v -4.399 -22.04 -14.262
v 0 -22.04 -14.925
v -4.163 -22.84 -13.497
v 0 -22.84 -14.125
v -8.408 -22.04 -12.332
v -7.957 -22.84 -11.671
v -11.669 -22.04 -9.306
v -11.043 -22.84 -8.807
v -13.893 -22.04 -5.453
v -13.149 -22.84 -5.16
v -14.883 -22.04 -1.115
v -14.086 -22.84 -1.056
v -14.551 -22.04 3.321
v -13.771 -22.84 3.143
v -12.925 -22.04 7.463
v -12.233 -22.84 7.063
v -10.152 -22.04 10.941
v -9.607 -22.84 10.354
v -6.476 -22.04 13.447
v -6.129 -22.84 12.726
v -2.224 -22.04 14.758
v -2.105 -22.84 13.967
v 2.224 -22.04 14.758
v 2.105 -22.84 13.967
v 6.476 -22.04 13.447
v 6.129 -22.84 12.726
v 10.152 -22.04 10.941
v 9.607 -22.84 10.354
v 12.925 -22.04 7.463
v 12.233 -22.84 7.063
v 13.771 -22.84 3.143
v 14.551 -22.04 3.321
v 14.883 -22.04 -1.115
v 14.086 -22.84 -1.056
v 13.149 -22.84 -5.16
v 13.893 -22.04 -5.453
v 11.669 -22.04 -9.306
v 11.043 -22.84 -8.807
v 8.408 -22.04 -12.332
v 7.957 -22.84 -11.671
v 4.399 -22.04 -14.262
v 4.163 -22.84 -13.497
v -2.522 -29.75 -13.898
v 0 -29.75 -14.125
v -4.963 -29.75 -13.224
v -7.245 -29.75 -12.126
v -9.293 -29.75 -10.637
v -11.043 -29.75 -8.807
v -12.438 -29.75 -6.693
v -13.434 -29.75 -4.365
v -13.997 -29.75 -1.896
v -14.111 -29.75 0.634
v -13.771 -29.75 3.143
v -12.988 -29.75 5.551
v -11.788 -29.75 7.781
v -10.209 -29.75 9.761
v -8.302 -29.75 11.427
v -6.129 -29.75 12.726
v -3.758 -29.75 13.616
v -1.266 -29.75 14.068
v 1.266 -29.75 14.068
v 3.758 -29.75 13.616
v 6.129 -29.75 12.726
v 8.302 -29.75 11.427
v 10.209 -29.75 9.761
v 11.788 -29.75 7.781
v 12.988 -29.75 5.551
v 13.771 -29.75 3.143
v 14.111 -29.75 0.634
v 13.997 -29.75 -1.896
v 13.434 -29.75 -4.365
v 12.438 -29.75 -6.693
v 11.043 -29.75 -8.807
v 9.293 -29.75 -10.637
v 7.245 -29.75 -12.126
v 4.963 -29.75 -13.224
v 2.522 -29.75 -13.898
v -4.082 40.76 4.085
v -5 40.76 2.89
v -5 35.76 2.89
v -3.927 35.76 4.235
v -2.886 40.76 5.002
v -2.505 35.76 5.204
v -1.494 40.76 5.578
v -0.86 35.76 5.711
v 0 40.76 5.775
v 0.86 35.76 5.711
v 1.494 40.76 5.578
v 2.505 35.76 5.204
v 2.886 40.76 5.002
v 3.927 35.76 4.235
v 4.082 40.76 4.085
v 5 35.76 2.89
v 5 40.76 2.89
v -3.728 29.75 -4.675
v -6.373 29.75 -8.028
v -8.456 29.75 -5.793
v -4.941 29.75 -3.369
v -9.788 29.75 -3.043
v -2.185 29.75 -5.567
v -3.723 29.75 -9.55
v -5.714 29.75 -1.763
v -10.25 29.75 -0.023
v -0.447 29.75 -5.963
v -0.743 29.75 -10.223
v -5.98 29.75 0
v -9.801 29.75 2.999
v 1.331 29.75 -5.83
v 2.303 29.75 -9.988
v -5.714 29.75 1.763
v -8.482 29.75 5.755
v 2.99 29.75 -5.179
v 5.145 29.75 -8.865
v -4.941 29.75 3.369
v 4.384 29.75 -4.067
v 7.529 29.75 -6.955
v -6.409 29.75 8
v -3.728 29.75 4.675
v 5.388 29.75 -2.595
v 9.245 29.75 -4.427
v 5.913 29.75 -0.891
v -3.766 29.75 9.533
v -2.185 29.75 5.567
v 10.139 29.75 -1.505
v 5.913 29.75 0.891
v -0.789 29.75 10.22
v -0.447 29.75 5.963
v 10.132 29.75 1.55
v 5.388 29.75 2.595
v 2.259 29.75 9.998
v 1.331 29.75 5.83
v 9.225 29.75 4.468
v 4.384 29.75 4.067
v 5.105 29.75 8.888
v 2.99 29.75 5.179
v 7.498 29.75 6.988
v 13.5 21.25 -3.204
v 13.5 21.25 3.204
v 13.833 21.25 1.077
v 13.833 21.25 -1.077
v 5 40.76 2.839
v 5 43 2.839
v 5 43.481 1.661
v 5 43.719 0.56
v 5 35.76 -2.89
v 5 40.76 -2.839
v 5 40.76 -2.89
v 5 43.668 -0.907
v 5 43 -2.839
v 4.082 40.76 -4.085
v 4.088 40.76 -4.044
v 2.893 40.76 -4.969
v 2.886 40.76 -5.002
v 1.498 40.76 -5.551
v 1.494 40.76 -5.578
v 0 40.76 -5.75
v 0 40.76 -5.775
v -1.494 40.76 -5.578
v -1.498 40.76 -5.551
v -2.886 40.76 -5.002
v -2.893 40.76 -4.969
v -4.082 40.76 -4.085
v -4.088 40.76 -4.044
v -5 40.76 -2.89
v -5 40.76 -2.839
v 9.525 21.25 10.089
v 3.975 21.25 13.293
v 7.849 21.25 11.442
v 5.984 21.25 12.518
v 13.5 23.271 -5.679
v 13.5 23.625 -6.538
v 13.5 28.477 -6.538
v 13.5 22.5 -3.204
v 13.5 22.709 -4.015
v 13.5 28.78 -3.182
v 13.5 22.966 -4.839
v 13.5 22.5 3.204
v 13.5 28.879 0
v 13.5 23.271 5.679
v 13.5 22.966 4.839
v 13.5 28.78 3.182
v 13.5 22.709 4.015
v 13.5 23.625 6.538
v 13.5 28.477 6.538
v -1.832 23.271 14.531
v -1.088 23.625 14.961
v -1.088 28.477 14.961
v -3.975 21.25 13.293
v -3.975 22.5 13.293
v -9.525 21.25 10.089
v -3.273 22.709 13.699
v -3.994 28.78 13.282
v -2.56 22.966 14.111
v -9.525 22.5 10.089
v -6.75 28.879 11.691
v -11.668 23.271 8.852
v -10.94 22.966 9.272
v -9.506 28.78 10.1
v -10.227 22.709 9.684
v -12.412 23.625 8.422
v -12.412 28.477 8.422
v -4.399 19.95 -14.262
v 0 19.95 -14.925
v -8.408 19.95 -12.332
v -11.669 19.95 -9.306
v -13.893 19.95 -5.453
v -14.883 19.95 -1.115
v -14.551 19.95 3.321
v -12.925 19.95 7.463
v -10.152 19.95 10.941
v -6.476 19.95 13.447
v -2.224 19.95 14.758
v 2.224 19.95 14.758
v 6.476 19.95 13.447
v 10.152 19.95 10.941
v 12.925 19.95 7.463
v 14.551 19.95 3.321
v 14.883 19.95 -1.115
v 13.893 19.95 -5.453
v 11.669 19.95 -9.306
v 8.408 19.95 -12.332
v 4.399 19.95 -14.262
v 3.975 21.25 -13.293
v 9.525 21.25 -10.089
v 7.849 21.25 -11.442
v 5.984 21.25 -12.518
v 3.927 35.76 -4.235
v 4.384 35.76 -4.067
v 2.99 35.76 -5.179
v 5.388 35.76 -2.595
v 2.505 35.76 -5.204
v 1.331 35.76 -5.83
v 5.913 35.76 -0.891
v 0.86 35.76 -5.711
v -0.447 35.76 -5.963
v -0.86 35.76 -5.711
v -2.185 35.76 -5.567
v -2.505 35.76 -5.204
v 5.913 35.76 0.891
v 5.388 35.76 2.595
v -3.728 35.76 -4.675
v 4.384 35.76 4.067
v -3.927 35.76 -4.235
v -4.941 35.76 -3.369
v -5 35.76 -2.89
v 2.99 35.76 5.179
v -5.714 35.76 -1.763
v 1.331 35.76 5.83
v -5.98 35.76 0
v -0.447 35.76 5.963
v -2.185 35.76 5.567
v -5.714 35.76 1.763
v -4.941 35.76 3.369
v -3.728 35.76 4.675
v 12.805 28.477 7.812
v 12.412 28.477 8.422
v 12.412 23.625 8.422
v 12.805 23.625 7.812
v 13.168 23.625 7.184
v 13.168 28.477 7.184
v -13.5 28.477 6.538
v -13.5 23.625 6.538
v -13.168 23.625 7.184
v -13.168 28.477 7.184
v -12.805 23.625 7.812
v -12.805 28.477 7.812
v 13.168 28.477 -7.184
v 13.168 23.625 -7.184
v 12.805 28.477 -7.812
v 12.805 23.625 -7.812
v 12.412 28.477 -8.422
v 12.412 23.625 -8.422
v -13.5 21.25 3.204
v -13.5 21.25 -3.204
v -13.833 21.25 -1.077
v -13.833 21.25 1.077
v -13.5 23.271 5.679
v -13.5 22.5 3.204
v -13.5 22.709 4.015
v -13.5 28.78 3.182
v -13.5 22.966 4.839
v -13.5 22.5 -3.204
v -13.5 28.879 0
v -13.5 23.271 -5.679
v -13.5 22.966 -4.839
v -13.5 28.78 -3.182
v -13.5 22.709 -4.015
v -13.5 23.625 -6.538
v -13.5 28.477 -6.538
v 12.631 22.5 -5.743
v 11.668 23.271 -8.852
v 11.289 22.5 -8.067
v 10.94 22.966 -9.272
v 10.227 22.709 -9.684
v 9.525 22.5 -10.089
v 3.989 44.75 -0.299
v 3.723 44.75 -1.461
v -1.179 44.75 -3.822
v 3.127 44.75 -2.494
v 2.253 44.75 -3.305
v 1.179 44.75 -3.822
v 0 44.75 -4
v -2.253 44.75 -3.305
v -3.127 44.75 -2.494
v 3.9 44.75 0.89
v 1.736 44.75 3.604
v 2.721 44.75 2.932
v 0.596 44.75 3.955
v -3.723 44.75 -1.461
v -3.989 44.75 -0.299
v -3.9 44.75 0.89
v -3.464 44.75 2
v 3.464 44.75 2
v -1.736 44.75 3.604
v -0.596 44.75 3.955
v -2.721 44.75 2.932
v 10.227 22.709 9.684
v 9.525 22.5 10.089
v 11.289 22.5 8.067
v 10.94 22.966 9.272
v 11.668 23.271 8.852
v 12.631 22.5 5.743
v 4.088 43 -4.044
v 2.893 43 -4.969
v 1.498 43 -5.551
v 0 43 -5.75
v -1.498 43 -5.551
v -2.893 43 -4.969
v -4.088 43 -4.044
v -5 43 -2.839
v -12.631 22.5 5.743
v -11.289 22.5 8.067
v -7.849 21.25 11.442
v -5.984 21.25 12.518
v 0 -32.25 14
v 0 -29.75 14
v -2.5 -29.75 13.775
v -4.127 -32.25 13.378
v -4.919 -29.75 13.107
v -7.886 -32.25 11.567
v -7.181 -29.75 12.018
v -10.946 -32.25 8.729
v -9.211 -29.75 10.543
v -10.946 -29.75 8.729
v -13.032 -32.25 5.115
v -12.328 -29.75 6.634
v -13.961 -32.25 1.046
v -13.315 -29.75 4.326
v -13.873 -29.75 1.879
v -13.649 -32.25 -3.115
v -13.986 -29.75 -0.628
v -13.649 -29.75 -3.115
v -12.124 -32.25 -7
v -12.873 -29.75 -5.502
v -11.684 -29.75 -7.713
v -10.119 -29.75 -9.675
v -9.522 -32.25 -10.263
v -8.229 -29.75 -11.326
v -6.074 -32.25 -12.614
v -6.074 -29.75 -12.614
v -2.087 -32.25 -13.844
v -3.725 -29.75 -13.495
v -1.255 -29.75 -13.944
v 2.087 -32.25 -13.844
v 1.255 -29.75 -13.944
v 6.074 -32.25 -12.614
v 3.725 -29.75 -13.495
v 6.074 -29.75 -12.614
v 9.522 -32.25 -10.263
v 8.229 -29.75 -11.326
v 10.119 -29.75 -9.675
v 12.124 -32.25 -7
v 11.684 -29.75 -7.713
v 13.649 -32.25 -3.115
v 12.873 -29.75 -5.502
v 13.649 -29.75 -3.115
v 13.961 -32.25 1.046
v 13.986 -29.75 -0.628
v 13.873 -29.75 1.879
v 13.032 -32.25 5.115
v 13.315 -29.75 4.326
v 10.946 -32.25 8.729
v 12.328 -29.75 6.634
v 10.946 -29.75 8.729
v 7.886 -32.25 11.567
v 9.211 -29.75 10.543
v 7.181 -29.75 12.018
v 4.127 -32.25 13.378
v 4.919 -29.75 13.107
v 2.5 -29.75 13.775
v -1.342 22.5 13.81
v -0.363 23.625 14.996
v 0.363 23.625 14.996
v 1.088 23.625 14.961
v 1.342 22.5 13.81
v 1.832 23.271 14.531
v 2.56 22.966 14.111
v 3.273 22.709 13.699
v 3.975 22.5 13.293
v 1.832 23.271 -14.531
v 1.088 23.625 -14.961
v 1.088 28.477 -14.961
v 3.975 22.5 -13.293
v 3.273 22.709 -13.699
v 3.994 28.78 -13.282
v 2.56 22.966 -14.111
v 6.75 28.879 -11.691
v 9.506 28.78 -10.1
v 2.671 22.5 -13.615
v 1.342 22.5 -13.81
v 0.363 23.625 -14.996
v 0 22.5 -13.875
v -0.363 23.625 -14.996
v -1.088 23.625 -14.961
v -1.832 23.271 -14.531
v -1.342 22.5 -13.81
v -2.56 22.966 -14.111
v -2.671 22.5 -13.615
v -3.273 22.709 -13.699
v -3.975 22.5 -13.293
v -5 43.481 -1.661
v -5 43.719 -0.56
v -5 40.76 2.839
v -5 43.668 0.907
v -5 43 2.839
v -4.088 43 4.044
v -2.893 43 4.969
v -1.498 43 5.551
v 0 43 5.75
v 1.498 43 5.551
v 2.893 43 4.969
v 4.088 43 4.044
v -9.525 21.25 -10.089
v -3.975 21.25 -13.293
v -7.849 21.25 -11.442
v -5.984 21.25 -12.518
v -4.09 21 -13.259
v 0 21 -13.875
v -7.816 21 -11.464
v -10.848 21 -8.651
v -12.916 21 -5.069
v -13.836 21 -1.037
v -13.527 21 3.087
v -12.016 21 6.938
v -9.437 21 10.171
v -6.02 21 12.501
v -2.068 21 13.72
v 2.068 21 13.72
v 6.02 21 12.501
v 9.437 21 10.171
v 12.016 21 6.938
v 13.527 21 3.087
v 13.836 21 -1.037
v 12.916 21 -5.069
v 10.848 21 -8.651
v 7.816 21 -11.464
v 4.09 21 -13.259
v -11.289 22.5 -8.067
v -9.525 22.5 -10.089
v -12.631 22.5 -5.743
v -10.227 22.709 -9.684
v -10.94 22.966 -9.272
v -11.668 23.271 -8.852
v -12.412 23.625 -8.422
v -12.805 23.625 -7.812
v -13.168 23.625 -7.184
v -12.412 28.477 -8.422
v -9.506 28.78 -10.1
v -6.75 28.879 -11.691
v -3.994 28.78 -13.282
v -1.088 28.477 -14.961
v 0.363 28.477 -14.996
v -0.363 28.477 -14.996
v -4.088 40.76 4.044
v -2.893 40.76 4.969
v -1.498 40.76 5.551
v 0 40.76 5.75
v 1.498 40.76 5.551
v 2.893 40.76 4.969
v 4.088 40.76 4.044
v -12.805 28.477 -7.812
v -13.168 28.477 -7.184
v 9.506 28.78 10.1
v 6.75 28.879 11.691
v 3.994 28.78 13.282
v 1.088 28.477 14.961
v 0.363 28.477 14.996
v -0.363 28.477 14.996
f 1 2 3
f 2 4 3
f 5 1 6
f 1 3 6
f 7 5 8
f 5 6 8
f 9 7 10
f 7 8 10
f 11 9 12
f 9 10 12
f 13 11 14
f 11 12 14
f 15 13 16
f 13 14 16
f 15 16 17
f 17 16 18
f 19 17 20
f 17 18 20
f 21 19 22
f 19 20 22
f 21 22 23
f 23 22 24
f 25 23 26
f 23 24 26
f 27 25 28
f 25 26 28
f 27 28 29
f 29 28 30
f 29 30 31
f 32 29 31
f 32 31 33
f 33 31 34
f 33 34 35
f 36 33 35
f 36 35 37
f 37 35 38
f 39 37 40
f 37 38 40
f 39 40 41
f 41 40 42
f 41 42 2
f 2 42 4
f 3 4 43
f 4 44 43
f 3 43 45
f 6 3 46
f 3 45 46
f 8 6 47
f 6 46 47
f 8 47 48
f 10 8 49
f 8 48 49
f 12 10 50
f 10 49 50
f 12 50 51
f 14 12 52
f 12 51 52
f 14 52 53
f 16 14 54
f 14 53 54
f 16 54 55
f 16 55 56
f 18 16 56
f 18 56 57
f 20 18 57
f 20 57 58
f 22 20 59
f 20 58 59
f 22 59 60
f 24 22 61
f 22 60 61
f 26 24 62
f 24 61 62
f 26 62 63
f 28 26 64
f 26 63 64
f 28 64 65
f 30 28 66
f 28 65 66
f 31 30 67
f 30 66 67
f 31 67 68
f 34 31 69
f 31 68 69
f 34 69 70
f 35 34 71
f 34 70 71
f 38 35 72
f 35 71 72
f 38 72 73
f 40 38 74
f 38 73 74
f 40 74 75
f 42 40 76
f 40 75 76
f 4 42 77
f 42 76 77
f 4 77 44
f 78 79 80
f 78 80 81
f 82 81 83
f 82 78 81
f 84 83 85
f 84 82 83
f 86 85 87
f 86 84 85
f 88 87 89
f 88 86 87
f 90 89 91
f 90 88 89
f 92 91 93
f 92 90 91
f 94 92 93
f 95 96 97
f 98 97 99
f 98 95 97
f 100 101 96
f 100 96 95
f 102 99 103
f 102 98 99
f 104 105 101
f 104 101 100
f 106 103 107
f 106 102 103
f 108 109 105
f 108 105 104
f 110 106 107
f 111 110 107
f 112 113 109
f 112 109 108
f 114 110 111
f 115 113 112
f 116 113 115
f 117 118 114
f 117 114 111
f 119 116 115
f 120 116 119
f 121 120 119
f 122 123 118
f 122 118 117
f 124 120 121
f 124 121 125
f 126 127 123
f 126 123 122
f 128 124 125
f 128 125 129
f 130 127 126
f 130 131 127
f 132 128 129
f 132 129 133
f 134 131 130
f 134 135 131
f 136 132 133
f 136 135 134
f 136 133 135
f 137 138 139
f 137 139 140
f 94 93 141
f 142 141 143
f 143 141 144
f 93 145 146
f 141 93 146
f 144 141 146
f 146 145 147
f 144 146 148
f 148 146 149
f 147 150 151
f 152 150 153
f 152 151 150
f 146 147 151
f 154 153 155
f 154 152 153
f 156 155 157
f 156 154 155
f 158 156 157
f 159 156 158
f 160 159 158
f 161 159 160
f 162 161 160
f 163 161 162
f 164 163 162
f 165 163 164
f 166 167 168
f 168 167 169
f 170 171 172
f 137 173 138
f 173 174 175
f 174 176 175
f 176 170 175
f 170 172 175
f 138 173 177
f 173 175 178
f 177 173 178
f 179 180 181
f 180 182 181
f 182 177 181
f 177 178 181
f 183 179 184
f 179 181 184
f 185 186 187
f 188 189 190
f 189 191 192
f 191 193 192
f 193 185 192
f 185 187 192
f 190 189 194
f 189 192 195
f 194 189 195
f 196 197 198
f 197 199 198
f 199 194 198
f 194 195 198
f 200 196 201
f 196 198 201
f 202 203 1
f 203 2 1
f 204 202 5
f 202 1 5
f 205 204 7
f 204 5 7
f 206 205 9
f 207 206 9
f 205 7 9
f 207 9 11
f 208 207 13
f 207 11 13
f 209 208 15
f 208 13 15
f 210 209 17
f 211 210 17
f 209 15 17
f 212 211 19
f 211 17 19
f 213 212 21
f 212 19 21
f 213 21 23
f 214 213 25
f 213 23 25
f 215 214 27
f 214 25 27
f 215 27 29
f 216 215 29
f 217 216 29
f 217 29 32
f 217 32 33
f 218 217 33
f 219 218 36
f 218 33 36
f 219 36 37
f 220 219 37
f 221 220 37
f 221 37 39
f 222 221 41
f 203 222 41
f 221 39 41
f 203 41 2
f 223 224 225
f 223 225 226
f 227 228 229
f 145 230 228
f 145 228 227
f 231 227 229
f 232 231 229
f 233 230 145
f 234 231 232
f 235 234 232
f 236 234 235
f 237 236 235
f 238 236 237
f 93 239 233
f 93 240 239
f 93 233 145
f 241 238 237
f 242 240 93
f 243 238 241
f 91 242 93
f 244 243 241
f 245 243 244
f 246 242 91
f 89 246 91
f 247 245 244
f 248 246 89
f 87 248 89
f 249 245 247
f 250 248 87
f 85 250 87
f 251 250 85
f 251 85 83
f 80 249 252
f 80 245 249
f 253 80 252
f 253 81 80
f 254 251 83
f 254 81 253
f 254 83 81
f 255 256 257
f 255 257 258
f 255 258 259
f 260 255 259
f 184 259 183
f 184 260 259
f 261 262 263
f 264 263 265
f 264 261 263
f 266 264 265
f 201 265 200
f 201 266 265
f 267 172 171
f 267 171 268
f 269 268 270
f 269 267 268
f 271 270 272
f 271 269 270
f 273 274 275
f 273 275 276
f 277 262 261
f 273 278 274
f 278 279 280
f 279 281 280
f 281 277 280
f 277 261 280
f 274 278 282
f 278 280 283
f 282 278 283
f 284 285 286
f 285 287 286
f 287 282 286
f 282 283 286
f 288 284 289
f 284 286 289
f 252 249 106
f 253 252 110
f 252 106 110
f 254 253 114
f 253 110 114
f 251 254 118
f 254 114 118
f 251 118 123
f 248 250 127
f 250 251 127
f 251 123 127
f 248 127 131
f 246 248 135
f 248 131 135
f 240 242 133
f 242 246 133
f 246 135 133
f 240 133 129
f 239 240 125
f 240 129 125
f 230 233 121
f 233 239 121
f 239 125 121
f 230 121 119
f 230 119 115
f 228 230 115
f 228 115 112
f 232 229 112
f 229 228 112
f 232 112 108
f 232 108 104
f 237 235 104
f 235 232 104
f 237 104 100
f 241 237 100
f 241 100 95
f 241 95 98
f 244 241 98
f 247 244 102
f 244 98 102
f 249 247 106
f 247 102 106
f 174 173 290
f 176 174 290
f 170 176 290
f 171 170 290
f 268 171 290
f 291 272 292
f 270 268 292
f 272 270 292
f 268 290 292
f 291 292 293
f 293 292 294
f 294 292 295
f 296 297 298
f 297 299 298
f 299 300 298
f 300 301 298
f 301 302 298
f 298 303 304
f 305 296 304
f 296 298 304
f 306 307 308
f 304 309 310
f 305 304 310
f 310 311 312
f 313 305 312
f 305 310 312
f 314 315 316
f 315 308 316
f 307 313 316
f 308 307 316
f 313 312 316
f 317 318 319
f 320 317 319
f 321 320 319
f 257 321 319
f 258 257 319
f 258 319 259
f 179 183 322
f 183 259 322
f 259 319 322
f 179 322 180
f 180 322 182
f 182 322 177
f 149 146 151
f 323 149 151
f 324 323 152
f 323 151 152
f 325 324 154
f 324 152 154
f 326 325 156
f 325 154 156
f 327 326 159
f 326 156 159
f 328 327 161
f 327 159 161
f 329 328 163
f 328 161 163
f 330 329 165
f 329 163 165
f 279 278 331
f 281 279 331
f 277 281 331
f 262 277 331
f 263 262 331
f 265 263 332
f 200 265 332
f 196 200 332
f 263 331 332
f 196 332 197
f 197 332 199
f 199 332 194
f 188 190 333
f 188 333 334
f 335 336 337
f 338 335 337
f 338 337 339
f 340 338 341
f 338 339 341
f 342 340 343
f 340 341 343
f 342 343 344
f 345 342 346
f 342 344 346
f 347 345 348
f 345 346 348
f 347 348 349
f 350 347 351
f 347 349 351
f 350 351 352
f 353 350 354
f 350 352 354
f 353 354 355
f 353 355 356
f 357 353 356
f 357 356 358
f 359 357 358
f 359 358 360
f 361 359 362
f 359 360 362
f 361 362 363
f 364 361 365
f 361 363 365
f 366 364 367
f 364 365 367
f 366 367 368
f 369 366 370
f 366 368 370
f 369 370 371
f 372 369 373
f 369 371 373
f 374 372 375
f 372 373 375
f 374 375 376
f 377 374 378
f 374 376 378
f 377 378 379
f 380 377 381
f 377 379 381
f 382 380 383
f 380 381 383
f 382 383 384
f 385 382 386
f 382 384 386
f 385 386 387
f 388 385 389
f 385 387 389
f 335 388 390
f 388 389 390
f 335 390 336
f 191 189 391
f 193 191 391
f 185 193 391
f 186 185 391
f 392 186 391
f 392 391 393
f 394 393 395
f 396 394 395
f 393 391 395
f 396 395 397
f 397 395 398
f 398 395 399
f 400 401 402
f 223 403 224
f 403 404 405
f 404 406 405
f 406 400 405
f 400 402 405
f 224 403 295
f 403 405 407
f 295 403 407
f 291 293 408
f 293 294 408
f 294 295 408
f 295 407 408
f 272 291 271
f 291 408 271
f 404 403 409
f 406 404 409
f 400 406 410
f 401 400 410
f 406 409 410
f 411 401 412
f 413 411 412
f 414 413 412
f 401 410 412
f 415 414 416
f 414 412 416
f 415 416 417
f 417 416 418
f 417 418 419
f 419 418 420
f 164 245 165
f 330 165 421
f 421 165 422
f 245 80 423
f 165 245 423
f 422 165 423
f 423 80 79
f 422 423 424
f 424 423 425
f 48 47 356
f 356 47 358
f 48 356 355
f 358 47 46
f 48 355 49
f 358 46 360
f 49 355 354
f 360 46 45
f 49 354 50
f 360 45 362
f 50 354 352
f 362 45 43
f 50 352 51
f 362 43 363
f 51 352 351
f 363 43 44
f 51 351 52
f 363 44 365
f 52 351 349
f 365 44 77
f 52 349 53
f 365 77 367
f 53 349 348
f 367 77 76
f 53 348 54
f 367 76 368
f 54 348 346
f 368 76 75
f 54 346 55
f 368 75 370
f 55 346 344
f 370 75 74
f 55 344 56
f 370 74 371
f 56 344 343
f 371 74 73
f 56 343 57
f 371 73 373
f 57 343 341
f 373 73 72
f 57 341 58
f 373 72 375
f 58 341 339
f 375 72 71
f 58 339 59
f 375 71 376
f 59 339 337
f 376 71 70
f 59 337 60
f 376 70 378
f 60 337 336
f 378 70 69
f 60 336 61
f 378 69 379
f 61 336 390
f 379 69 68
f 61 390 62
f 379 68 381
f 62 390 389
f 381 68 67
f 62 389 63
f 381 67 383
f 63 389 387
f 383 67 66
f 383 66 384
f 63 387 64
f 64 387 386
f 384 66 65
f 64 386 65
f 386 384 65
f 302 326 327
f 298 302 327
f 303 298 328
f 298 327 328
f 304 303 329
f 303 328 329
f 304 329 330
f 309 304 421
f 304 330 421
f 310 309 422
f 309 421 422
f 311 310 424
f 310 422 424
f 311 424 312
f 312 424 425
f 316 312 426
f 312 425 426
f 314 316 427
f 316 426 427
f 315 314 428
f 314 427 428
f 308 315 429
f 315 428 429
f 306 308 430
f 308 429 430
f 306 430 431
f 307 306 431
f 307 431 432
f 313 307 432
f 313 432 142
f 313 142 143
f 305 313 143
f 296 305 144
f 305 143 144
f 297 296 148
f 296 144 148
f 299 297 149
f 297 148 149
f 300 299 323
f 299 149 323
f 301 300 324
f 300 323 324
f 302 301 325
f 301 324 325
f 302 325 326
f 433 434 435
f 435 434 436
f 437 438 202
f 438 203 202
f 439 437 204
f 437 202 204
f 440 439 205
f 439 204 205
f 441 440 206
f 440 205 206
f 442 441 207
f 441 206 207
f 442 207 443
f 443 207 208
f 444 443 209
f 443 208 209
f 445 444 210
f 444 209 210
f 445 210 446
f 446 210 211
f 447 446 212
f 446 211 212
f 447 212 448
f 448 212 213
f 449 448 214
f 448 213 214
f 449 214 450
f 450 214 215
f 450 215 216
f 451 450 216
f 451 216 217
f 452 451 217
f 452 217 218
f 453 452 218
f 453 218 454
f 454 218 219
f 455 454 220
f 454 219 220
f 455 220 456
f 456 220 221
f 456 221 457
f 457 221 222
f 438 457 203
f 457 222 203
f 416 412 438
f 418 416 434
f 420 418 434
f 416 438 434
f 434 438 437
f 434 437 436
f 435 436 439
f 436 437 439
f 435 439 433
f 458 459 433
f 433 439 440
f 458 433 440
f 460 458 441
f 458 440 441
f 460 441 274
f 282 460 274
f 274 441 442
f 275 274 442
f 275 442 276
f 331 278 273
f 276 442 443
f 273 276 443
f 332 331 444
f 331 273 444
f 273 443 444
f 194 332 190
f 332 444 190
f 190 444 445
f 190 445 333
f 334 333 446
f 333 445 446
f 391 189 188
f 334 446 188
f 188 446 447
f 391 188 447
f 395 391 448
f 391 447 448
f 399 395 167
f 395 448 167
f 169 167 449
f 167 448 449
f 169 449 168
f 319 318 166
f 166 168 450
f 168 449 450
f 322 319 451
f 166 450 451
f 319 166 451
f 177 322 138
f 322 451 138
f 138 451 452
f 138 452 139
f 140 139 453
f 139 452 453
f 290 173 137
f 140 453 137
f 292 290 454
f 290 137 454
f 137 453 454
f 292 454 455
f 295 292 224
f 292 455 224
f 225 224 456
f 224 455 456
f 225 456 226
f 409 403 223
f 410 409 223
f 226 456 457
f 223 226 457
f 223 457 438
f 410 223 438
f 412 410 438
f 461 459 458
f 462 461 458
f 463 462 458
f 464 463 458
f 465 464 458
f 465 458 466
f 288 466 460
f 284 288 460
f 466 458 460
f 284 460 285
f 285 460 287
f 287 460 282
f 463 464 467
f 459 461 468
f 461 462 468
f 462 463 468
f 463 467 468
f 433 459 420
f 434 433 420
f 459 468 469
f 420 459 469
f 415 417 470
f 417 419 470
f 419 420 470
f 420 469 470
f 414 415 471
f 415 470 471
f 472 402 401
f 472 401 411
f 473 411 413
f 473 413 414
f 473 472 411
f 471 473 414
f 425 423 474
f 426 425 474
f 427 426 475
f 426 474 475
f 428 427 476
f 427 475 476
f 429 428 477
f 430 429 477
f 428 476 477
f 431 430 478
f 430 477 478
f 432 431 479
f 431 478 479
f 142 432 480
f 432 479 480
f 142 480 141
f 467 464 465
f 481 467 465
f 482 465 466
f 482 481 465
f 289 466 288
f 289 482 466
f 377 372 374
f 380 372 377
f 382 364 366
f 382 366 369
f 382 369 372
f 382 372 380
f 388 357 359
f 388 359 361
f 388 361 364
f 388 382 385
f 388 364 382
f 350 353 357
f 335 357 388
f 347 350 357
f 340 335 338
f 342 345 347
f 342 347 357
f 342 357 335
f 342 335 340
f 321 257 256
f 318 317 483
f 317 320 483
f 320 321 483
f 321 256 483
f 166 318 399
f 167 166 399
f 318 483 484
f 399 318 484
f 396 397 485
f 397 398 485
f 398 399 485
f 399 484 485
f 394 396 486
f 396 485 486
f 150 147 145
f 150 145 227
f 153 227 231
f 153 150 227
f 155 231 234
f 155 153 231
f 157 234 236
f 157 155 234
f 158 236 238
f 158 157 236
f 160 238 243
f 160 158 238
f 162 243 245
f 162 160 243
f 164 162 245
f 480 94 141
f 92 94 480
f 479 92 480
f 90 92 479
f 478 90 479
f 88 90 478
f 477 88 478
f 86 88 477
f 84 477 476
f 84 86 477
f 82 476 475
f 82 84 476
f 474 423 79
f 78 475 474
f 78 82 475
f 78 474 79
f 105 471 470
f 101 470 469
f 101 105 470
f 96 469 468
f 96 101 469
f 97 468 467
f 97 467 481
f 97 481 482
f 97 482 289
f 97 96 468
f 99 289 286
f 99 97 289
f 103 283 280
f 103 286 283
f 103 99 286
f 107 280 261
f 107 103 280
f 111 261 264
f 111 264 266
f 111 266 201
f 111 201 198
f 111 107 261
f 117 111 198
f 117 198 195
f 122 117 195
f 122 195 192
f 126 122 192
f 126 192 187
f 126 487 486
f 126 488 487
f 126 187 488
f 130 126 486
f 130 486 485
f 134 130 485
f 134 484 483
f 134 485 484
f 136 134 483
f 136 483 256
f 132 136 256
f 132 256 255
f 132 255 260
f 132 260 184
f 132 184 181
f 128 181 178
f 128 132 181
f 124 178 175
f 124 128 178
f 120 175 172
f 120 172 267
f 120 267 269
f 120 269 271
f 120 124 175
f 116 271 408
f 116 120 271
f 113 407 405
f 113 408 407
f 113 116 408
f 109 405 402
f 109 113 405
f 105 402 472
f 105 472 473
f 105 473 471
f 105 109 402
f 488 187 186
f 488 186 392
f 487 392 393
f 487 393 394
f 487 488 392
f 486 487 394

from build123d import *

# Parameters (mm, degrees)
SKETCH1_R          = 15
STOCK_DEPTH        = 29.75
HEX_HEAD_DEPTH     = 8.5
SKETCH5_R          = 14
RETAINER_DEPTH     = 2.5
SKETCH9_W          = 1.368260999
SKETCH9_H          = 3.99
SKETCH9_W_2        = 1.545391276
CUT_EXTRUDE3_DEPTH = 13.475
SKETCH10_R         = 5.98
EXTRUDE4_DEPTH     = 11.01
SKETCH11_R         = 5.98
SKETCH11_R_2       = 5.775
CUT_EXTRUDE4_DEPTH = 5
SKETCH13_W         = 0.98
SKETCH13_H         = 5
CUT_EXTRUDE5_DEPTH = 15


with BuildPart() as part:
    # Sketch1 → STOCK (new body, symmetric)
    with BuildSketch(Plane(origin=(0, 0, 0), x_dir=(1, 0, 0), z_dir=(0, 1, 0))):
        with Locations(Location((0, 0, 0), (0, 0, 270))):  # turned: the seam where the file's is
            Circle(SKETCH1_R)
    extrude(amount=STOCK_DEPTH, both=True)

    # Sketch2 → HEX_HEAD (cut)
    with BuildSketch(Plane(origin=(0, 29.75, 0), x_dir=(1, 0, 0), z_dir=(0, 1, 0))):
        with BuildLine():
            ThreePointArc((12.412375826, 8.422168743), (7.5, 12.990381057), (1.087624174, 14.960517159))
            Line((1.087624174, 14.960517159), (12.412375826, 8.422168743))
        make_face()
        with BuildLine():
            Line((-12.412375826, 8.422168743), (-1.087624174, 14.960517159))
            ThreePointArc((-1.087624174, 14.960517159), (-7.5, 12.990381057), (-12.412375826, 8.422168743))
        make_face()
        with BuildLine():
            Line((13.5, 6.538348415), (13.5, -6.538348415))
            ThreePointArc((13.5, -6.538348415), (15, 0), (13.5, 6.538348415))
        make_face()
        with BuildLine():
            Line((-13.5, -6.538348415), (-13.5, 6.538348415))
            ThreePointArc((-13.5, 6.538348415), (-15, 0), (-13.5, -6.538348415))
        make_face()
        with BuildLine():
            Line((12.412375826, -8.422168743), (1.087624174, -14.960517159))
            ThreePointArc((1.087624174, -14.960517159), (7.5, -12.990381057), (12.412375826, -8.422168743))
        make_face()
        with BuildLine():
            Line((-1.087624174, -14.960517159), (-12.412375826, -8.422168743))
            ThreePointArc((-12.412375826, -8.422168743), (-7.5, -12.990381057), (-1.087624174, -14.960517159))
        make_face()
    extrude(amount=-HEX_HEAD_DEPTH, mode=Mode.SUBTRACT)

    # Sketch3 → CROWN (revolve, cut)
    with BuildSketch(Plane.XY, mode=Mode.PRIVATE) as crown_sk:
        Polygon((10.25, 29.75), (15, 29.75), (15, 28.477241336), align=None)
    revolve(crown_sk.sketch.rotate(Axis((0, 0, 0), (0, 1, 0)), 94.158067237), axis=Axis((0, 0, 0), (0, 1, 0)), mode=Mode.SUBTRACT)  # turned: the seam where the file's is

    # Sketch4 → Cut-Revolve1 (revolve, cut)
    with BuildSketch(Plane.XY, mode=Mode.PRIVATE) as cut_revolve1_sk:
        Polygon((14.125, -29.75), (16.897307641, -29.75), (16.897307641, 25.522307641), (13.875, 22.5), (13.875, 21), (14.925, 19.95), (14.925, -22.04), (14.125, -22.84), align=None)
    revolve(cut_revolve1_sk.sketch.rotate(Axis((0, -34.538461529, 0), (0, 1, 0)), 90), axis=Axis((0, -34.538461529, 0), (0, 1, 0)), mode=Mode.SUBTRACT)  # turned: the seam where the file's is

    # Sketch5 → RETAINER (add)
    with BuildSketch(Plane.XZ.offset(29.75)):
        with Locations(Location((0, 0, 0), (0, 0, 90))):  # turned: the seam where the file's is
            Circle(SKETCH5_R)
    extrude(amount=RETAINER_DEPTH)



with BuildPart() as body_2:
    # Sketch8 → Revolve1 (revolve)
    with BuildSketch(Plane.XY, mode=Mode.PRIVATE) as revolve1_sk:
        Polygon((0, 44.75), (4, 44.75), (5.75, 43), (5.75, 40.76), (0, 40.76), align=None)
    revolve(revolve1_sk.sketch.rotate(Axis((0, 0, 0), (0, 1, 0)), 90), axis=Axis((0, 0, 0), (0, 1, 0)))  # turned: the seam where the file's is

    # Sketch9 → Cut-Extrude3 (cut, symmetric)
    with BuildSketch(Plane.XY):
        with Locations((5.6841305, 42.755)):
            Rectangle(SKETCH9_W, SKETCH9_H)
        with Locations((-5.772695638, 42.755)):
            Rectangle(SKETCH9_W_2, SKETCH9_H)
    extrude(amount=CUT_EXTRUDE3_DEPTH, both=True, mode=Mode.SUBTRACT)


with BuildPart() as part_1:
    add(part.part)

    add(body_2.part)  # Extrude4 merges body 2
    # Sketch10 → Extrude4 (add)
    with BuildSketch(Plane(origin=(0, 29.75, 0), x_dir=(1, 0, 0), z_dir=(0, 1, 0))):
        with Locations(Location((0, 0, 0), (0, 0, 180))):  # turned: the seam where the file's is
            Circle(SKETCH10_R)
    extrude(amount=EXTRUDE4_DEPTH)

    # Sketch11 → Cut-Extrude4 (cut)
    with BuildSketch(Plane(origin=(0, 40.76, 0), x_dir=(1, 0, 0), z_dir=(0, 1, 0))):
        with Locations(Location((0, 0, 0), (0, 0, 180))):  # turned: the seam where the file's is
            Circle(SKETCH11_R)
        with Locations(Location((0, 0, 0), (0, 0, 180))):  # turned: the seam where the file's is
            Circle(SKETCH11_R_2, mode=Mode.SUBTRACT)
    extrude(amount=-CUT_EXTRUDE4_DEPTH, mode=Mode.SUBTRACT)

    # Sketch13 → Cut-Extrude5 (cut, symmetric)
    with BuildSketch(Plane.XY):
        with Locations((5.49, 38.26)):
            Rectangle(SKETCH13_W, SKETCH13_H)
        with Locations((-5.49, 38.26)):
            Rectangle(SKETCH13_W, SKETCH13_H)
    extrude(amount=CUT_EXTRUDE5_DEPTH, both=True, mode=Mode.SUBTRACT)


solid = part_1.part
